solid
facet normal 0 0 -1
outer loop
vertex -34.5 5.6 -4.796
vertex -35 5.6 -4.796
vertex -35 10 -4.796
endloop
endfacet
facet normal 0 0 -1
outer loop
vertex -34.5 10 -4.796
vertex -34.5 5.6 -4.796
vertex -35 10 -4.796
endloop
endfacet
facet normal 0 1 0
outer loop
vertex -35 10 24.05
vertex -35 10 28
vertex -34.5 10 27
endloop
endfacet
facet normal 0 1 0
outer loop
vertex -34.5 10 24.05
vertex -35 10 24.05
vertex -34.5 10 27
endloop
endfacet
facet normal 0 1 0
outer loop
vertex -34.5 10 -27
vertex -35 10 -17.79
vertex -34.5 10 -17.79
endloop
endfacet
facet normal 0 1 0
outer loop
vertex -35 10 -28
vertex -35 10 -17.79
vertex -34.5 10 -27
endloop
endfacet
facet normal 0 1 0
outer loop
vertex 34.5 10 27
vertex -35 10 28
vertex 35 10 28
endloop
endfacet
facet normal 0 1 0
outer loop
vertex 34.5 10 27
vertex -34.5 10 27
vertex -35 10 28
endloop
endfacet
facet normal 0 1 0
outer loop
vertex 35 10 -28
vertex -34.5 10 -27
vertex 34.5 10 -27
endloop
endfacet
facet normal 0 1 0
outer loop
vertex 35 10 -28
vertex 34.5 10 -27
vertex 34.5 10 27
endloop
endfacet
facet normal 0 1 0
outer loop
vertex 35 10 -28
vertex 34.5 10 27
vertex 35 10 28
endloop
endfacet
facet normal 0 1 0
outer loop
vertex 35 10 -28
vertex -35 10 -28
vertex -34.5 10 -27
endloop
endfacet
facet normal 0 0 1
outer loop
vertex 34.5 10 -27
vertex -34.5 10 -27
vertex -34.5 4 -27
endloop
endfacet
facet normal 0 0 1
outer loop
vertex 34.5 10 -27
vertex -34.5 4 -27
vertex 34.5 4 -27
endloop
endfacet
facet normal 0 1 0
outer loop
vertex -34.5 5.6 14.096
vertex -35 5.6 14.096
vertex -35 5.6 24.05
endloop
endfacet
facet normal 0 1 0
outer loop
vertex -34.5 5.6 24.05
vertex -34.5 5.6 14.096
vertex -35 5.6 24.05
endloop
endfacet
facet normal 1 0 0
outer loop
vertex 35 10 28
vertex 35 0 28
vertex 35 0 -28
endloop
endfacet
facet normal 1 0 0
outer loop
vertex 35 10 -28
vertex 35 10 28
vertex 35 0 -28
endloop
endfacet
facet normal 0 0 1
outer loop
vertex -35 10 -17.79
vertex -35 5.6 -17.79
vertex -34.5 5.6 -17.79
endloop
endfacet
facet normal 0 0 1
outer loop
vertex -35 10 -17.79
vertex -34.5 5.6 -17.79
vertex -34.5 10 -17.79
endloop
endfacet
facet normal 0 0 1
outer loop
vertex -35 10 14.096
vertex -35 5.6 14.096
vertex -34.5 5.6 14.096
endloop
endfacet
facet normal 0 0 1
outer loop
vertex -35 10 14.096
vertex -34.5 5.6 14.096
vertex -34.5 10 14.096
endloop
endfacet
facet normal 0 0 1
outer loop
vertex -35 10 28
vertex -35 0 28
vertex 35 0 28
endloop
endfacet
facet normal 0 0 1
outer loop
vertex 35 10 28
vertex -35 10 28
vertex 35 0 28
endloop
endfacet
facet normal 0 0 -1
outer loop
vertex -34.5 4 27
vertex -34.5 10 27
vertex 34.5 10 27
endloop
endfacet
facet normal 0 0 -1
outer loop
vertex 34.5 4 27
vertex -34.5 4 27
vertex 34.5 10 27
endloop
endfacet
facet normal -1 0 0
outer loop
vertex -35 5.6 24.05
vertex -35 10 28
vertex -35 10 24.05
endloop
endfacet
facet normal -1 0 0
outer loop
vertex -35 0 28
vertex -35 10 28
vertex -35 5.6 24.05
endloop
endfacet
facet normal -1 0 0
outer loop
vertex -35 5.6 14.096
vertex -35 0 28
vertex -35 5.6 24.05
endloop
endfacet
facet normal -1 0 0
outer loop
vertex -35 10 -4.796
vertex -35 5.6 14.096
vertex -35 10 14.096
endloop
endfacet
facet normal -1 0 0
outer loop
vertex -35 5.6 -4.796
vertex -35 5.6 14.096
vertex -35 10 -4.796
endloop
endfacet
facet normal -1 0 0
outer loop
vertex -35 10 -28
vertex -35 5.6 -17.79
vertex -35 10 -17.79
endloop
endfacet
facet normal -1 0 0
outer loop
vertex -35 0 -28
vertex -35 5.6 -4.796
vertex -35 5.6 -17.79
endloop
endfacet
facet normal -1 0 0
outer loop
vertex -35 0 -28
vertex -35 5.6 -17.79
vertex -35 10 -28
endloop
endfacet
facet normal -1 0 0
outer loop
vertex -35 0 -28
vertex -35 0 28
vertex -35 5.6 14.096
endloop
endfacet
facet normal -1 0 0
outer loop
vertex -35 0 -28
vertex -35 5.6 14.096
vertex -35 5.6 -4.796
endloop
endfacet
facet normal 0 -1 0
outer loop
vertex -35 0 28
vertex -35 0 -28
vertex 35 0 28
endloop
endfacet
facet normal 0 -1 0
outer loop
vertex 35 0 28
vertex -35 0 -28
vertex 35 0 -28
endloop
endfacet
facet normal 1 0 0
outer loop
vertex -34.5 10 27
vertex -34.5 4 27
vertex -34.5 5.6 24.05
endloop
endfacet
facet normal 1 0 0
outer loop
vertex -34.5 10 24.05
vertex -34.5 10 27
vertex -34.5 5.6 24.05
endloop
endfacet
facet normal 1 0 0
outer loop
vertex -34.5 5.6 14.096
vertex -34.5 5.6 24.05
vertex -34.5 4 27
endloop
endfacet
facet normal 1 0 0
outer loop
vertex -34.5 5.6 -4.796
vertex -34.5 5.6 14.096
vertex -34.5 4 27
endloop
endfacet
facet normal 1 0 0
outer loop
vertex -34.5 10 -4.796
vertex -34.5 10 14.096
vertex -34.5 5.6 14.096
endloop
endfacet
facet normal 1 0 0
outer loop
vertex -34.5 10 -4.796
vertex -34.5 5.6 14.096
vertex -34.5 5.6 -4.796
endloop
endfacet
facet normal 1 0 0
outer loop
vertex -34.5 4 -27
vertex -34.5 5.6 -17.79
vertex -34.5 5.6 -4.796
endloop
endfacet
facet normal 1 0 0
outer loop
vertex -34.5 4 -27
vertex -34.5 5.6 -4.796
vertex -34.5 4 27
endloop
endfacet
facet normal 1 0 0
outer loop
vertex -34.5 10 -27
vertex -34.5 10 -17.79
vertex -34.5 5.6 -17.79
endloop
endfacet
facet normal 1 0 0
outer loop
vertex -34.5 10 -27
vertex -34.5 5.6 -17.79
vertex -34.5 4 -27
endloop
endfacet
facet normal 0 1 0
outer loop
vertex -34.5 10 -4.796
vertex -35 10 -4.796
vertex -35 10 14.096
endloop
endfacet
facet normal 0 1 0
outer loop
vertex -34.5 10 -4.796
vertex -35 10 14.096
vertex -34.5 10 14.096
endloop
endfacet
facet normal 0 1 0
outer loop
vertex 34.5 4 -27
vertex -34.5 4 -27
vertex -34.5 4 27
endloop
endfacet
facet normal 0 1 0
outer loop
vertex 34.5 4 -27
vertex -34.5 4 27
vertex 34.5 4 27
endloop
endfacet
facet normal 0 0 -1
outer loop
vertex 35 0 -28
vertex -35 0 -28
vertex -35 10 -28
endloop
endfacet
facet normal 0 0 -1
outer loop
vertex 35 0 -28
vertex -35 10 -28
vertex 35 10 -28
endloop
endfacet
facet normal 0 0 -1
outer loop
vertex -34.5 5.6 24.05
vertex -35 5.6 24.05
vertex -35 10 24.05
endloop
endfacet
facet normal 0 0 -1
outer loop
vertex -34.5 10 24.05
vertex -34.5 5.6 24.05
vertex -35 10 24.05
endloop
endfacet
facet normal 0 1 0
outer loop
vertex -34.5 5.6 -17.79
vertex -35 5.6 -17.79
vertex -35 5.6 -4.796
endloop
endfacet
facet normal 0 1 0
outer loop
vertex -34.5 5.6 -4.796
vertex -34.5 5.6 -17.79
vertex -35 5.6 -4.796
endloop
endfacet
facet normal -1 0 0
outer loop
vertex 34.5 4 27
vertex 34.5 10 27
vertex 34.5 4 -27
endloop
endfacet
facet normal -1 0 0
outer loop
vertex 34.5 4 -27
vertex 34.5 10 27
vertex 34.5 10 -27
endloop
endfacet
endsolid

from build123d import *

# Parameters (mm, degrees)
SKETCH1_W           = 70
SKETCH1_H           = 56
BOSS_EXTRUDE1_DEPTH = 10
SKETCH2_W           = 69
SKETCH2_H           = 54
CUT_EXTRUDE1_DEPTH  = 6
SKETCH3_W           = 12.993398332
SKETCH3_H           = 10.754862036
SKETCH3_W_2         = 9.953735061
SKETCH3_H_2         = 10.5
CUT_EXTRUDE2_DEPTH  = 10


with BuildPart() as part:
    # Sketch1 → Boss-Extrude1 (new body)
    with BuildSketch(Plane(origin=(0, 0, 0), x_dir=(1, 0, 0), z_dir=(0, 1, 0))):
        Rectangle(SKETCH1_W, SKETCH1_H)
    extrude(amount=BOSS_EXTRUDE1_DEPTH)

    # Sketch2 → Cut-Extrude1 (cut)
    with BuildSketch(Plane(origin=(0, 10, 0), x_dir=(1, 0, 0), z_dir=(0, 1, 0))):
        Rectangle(SKETCH2_W, SKETCH2_H)
    extrude(amount=-CUT_EXTRUDE1_DEPTH, mode=Mode.SUBTRACT)

    # Sketch3 → Cut-Extrude2 (cut)
    with BuildSketch(Plane.ZY.offset(35)):
        with Locations((-11.292948147, 10.977431018)):
            Rectangle(SKETCH3_W, SKETCH3_H)
        with Locations((19.073286927, 10.85)):
            Rectangle(SKETCH3_W_2, SKETCH3_H_2)
    extrude(amount=-CUT_EXTRUDE2_DEPTH, mode=Mode.SUBTRACT)


solid = part.part
